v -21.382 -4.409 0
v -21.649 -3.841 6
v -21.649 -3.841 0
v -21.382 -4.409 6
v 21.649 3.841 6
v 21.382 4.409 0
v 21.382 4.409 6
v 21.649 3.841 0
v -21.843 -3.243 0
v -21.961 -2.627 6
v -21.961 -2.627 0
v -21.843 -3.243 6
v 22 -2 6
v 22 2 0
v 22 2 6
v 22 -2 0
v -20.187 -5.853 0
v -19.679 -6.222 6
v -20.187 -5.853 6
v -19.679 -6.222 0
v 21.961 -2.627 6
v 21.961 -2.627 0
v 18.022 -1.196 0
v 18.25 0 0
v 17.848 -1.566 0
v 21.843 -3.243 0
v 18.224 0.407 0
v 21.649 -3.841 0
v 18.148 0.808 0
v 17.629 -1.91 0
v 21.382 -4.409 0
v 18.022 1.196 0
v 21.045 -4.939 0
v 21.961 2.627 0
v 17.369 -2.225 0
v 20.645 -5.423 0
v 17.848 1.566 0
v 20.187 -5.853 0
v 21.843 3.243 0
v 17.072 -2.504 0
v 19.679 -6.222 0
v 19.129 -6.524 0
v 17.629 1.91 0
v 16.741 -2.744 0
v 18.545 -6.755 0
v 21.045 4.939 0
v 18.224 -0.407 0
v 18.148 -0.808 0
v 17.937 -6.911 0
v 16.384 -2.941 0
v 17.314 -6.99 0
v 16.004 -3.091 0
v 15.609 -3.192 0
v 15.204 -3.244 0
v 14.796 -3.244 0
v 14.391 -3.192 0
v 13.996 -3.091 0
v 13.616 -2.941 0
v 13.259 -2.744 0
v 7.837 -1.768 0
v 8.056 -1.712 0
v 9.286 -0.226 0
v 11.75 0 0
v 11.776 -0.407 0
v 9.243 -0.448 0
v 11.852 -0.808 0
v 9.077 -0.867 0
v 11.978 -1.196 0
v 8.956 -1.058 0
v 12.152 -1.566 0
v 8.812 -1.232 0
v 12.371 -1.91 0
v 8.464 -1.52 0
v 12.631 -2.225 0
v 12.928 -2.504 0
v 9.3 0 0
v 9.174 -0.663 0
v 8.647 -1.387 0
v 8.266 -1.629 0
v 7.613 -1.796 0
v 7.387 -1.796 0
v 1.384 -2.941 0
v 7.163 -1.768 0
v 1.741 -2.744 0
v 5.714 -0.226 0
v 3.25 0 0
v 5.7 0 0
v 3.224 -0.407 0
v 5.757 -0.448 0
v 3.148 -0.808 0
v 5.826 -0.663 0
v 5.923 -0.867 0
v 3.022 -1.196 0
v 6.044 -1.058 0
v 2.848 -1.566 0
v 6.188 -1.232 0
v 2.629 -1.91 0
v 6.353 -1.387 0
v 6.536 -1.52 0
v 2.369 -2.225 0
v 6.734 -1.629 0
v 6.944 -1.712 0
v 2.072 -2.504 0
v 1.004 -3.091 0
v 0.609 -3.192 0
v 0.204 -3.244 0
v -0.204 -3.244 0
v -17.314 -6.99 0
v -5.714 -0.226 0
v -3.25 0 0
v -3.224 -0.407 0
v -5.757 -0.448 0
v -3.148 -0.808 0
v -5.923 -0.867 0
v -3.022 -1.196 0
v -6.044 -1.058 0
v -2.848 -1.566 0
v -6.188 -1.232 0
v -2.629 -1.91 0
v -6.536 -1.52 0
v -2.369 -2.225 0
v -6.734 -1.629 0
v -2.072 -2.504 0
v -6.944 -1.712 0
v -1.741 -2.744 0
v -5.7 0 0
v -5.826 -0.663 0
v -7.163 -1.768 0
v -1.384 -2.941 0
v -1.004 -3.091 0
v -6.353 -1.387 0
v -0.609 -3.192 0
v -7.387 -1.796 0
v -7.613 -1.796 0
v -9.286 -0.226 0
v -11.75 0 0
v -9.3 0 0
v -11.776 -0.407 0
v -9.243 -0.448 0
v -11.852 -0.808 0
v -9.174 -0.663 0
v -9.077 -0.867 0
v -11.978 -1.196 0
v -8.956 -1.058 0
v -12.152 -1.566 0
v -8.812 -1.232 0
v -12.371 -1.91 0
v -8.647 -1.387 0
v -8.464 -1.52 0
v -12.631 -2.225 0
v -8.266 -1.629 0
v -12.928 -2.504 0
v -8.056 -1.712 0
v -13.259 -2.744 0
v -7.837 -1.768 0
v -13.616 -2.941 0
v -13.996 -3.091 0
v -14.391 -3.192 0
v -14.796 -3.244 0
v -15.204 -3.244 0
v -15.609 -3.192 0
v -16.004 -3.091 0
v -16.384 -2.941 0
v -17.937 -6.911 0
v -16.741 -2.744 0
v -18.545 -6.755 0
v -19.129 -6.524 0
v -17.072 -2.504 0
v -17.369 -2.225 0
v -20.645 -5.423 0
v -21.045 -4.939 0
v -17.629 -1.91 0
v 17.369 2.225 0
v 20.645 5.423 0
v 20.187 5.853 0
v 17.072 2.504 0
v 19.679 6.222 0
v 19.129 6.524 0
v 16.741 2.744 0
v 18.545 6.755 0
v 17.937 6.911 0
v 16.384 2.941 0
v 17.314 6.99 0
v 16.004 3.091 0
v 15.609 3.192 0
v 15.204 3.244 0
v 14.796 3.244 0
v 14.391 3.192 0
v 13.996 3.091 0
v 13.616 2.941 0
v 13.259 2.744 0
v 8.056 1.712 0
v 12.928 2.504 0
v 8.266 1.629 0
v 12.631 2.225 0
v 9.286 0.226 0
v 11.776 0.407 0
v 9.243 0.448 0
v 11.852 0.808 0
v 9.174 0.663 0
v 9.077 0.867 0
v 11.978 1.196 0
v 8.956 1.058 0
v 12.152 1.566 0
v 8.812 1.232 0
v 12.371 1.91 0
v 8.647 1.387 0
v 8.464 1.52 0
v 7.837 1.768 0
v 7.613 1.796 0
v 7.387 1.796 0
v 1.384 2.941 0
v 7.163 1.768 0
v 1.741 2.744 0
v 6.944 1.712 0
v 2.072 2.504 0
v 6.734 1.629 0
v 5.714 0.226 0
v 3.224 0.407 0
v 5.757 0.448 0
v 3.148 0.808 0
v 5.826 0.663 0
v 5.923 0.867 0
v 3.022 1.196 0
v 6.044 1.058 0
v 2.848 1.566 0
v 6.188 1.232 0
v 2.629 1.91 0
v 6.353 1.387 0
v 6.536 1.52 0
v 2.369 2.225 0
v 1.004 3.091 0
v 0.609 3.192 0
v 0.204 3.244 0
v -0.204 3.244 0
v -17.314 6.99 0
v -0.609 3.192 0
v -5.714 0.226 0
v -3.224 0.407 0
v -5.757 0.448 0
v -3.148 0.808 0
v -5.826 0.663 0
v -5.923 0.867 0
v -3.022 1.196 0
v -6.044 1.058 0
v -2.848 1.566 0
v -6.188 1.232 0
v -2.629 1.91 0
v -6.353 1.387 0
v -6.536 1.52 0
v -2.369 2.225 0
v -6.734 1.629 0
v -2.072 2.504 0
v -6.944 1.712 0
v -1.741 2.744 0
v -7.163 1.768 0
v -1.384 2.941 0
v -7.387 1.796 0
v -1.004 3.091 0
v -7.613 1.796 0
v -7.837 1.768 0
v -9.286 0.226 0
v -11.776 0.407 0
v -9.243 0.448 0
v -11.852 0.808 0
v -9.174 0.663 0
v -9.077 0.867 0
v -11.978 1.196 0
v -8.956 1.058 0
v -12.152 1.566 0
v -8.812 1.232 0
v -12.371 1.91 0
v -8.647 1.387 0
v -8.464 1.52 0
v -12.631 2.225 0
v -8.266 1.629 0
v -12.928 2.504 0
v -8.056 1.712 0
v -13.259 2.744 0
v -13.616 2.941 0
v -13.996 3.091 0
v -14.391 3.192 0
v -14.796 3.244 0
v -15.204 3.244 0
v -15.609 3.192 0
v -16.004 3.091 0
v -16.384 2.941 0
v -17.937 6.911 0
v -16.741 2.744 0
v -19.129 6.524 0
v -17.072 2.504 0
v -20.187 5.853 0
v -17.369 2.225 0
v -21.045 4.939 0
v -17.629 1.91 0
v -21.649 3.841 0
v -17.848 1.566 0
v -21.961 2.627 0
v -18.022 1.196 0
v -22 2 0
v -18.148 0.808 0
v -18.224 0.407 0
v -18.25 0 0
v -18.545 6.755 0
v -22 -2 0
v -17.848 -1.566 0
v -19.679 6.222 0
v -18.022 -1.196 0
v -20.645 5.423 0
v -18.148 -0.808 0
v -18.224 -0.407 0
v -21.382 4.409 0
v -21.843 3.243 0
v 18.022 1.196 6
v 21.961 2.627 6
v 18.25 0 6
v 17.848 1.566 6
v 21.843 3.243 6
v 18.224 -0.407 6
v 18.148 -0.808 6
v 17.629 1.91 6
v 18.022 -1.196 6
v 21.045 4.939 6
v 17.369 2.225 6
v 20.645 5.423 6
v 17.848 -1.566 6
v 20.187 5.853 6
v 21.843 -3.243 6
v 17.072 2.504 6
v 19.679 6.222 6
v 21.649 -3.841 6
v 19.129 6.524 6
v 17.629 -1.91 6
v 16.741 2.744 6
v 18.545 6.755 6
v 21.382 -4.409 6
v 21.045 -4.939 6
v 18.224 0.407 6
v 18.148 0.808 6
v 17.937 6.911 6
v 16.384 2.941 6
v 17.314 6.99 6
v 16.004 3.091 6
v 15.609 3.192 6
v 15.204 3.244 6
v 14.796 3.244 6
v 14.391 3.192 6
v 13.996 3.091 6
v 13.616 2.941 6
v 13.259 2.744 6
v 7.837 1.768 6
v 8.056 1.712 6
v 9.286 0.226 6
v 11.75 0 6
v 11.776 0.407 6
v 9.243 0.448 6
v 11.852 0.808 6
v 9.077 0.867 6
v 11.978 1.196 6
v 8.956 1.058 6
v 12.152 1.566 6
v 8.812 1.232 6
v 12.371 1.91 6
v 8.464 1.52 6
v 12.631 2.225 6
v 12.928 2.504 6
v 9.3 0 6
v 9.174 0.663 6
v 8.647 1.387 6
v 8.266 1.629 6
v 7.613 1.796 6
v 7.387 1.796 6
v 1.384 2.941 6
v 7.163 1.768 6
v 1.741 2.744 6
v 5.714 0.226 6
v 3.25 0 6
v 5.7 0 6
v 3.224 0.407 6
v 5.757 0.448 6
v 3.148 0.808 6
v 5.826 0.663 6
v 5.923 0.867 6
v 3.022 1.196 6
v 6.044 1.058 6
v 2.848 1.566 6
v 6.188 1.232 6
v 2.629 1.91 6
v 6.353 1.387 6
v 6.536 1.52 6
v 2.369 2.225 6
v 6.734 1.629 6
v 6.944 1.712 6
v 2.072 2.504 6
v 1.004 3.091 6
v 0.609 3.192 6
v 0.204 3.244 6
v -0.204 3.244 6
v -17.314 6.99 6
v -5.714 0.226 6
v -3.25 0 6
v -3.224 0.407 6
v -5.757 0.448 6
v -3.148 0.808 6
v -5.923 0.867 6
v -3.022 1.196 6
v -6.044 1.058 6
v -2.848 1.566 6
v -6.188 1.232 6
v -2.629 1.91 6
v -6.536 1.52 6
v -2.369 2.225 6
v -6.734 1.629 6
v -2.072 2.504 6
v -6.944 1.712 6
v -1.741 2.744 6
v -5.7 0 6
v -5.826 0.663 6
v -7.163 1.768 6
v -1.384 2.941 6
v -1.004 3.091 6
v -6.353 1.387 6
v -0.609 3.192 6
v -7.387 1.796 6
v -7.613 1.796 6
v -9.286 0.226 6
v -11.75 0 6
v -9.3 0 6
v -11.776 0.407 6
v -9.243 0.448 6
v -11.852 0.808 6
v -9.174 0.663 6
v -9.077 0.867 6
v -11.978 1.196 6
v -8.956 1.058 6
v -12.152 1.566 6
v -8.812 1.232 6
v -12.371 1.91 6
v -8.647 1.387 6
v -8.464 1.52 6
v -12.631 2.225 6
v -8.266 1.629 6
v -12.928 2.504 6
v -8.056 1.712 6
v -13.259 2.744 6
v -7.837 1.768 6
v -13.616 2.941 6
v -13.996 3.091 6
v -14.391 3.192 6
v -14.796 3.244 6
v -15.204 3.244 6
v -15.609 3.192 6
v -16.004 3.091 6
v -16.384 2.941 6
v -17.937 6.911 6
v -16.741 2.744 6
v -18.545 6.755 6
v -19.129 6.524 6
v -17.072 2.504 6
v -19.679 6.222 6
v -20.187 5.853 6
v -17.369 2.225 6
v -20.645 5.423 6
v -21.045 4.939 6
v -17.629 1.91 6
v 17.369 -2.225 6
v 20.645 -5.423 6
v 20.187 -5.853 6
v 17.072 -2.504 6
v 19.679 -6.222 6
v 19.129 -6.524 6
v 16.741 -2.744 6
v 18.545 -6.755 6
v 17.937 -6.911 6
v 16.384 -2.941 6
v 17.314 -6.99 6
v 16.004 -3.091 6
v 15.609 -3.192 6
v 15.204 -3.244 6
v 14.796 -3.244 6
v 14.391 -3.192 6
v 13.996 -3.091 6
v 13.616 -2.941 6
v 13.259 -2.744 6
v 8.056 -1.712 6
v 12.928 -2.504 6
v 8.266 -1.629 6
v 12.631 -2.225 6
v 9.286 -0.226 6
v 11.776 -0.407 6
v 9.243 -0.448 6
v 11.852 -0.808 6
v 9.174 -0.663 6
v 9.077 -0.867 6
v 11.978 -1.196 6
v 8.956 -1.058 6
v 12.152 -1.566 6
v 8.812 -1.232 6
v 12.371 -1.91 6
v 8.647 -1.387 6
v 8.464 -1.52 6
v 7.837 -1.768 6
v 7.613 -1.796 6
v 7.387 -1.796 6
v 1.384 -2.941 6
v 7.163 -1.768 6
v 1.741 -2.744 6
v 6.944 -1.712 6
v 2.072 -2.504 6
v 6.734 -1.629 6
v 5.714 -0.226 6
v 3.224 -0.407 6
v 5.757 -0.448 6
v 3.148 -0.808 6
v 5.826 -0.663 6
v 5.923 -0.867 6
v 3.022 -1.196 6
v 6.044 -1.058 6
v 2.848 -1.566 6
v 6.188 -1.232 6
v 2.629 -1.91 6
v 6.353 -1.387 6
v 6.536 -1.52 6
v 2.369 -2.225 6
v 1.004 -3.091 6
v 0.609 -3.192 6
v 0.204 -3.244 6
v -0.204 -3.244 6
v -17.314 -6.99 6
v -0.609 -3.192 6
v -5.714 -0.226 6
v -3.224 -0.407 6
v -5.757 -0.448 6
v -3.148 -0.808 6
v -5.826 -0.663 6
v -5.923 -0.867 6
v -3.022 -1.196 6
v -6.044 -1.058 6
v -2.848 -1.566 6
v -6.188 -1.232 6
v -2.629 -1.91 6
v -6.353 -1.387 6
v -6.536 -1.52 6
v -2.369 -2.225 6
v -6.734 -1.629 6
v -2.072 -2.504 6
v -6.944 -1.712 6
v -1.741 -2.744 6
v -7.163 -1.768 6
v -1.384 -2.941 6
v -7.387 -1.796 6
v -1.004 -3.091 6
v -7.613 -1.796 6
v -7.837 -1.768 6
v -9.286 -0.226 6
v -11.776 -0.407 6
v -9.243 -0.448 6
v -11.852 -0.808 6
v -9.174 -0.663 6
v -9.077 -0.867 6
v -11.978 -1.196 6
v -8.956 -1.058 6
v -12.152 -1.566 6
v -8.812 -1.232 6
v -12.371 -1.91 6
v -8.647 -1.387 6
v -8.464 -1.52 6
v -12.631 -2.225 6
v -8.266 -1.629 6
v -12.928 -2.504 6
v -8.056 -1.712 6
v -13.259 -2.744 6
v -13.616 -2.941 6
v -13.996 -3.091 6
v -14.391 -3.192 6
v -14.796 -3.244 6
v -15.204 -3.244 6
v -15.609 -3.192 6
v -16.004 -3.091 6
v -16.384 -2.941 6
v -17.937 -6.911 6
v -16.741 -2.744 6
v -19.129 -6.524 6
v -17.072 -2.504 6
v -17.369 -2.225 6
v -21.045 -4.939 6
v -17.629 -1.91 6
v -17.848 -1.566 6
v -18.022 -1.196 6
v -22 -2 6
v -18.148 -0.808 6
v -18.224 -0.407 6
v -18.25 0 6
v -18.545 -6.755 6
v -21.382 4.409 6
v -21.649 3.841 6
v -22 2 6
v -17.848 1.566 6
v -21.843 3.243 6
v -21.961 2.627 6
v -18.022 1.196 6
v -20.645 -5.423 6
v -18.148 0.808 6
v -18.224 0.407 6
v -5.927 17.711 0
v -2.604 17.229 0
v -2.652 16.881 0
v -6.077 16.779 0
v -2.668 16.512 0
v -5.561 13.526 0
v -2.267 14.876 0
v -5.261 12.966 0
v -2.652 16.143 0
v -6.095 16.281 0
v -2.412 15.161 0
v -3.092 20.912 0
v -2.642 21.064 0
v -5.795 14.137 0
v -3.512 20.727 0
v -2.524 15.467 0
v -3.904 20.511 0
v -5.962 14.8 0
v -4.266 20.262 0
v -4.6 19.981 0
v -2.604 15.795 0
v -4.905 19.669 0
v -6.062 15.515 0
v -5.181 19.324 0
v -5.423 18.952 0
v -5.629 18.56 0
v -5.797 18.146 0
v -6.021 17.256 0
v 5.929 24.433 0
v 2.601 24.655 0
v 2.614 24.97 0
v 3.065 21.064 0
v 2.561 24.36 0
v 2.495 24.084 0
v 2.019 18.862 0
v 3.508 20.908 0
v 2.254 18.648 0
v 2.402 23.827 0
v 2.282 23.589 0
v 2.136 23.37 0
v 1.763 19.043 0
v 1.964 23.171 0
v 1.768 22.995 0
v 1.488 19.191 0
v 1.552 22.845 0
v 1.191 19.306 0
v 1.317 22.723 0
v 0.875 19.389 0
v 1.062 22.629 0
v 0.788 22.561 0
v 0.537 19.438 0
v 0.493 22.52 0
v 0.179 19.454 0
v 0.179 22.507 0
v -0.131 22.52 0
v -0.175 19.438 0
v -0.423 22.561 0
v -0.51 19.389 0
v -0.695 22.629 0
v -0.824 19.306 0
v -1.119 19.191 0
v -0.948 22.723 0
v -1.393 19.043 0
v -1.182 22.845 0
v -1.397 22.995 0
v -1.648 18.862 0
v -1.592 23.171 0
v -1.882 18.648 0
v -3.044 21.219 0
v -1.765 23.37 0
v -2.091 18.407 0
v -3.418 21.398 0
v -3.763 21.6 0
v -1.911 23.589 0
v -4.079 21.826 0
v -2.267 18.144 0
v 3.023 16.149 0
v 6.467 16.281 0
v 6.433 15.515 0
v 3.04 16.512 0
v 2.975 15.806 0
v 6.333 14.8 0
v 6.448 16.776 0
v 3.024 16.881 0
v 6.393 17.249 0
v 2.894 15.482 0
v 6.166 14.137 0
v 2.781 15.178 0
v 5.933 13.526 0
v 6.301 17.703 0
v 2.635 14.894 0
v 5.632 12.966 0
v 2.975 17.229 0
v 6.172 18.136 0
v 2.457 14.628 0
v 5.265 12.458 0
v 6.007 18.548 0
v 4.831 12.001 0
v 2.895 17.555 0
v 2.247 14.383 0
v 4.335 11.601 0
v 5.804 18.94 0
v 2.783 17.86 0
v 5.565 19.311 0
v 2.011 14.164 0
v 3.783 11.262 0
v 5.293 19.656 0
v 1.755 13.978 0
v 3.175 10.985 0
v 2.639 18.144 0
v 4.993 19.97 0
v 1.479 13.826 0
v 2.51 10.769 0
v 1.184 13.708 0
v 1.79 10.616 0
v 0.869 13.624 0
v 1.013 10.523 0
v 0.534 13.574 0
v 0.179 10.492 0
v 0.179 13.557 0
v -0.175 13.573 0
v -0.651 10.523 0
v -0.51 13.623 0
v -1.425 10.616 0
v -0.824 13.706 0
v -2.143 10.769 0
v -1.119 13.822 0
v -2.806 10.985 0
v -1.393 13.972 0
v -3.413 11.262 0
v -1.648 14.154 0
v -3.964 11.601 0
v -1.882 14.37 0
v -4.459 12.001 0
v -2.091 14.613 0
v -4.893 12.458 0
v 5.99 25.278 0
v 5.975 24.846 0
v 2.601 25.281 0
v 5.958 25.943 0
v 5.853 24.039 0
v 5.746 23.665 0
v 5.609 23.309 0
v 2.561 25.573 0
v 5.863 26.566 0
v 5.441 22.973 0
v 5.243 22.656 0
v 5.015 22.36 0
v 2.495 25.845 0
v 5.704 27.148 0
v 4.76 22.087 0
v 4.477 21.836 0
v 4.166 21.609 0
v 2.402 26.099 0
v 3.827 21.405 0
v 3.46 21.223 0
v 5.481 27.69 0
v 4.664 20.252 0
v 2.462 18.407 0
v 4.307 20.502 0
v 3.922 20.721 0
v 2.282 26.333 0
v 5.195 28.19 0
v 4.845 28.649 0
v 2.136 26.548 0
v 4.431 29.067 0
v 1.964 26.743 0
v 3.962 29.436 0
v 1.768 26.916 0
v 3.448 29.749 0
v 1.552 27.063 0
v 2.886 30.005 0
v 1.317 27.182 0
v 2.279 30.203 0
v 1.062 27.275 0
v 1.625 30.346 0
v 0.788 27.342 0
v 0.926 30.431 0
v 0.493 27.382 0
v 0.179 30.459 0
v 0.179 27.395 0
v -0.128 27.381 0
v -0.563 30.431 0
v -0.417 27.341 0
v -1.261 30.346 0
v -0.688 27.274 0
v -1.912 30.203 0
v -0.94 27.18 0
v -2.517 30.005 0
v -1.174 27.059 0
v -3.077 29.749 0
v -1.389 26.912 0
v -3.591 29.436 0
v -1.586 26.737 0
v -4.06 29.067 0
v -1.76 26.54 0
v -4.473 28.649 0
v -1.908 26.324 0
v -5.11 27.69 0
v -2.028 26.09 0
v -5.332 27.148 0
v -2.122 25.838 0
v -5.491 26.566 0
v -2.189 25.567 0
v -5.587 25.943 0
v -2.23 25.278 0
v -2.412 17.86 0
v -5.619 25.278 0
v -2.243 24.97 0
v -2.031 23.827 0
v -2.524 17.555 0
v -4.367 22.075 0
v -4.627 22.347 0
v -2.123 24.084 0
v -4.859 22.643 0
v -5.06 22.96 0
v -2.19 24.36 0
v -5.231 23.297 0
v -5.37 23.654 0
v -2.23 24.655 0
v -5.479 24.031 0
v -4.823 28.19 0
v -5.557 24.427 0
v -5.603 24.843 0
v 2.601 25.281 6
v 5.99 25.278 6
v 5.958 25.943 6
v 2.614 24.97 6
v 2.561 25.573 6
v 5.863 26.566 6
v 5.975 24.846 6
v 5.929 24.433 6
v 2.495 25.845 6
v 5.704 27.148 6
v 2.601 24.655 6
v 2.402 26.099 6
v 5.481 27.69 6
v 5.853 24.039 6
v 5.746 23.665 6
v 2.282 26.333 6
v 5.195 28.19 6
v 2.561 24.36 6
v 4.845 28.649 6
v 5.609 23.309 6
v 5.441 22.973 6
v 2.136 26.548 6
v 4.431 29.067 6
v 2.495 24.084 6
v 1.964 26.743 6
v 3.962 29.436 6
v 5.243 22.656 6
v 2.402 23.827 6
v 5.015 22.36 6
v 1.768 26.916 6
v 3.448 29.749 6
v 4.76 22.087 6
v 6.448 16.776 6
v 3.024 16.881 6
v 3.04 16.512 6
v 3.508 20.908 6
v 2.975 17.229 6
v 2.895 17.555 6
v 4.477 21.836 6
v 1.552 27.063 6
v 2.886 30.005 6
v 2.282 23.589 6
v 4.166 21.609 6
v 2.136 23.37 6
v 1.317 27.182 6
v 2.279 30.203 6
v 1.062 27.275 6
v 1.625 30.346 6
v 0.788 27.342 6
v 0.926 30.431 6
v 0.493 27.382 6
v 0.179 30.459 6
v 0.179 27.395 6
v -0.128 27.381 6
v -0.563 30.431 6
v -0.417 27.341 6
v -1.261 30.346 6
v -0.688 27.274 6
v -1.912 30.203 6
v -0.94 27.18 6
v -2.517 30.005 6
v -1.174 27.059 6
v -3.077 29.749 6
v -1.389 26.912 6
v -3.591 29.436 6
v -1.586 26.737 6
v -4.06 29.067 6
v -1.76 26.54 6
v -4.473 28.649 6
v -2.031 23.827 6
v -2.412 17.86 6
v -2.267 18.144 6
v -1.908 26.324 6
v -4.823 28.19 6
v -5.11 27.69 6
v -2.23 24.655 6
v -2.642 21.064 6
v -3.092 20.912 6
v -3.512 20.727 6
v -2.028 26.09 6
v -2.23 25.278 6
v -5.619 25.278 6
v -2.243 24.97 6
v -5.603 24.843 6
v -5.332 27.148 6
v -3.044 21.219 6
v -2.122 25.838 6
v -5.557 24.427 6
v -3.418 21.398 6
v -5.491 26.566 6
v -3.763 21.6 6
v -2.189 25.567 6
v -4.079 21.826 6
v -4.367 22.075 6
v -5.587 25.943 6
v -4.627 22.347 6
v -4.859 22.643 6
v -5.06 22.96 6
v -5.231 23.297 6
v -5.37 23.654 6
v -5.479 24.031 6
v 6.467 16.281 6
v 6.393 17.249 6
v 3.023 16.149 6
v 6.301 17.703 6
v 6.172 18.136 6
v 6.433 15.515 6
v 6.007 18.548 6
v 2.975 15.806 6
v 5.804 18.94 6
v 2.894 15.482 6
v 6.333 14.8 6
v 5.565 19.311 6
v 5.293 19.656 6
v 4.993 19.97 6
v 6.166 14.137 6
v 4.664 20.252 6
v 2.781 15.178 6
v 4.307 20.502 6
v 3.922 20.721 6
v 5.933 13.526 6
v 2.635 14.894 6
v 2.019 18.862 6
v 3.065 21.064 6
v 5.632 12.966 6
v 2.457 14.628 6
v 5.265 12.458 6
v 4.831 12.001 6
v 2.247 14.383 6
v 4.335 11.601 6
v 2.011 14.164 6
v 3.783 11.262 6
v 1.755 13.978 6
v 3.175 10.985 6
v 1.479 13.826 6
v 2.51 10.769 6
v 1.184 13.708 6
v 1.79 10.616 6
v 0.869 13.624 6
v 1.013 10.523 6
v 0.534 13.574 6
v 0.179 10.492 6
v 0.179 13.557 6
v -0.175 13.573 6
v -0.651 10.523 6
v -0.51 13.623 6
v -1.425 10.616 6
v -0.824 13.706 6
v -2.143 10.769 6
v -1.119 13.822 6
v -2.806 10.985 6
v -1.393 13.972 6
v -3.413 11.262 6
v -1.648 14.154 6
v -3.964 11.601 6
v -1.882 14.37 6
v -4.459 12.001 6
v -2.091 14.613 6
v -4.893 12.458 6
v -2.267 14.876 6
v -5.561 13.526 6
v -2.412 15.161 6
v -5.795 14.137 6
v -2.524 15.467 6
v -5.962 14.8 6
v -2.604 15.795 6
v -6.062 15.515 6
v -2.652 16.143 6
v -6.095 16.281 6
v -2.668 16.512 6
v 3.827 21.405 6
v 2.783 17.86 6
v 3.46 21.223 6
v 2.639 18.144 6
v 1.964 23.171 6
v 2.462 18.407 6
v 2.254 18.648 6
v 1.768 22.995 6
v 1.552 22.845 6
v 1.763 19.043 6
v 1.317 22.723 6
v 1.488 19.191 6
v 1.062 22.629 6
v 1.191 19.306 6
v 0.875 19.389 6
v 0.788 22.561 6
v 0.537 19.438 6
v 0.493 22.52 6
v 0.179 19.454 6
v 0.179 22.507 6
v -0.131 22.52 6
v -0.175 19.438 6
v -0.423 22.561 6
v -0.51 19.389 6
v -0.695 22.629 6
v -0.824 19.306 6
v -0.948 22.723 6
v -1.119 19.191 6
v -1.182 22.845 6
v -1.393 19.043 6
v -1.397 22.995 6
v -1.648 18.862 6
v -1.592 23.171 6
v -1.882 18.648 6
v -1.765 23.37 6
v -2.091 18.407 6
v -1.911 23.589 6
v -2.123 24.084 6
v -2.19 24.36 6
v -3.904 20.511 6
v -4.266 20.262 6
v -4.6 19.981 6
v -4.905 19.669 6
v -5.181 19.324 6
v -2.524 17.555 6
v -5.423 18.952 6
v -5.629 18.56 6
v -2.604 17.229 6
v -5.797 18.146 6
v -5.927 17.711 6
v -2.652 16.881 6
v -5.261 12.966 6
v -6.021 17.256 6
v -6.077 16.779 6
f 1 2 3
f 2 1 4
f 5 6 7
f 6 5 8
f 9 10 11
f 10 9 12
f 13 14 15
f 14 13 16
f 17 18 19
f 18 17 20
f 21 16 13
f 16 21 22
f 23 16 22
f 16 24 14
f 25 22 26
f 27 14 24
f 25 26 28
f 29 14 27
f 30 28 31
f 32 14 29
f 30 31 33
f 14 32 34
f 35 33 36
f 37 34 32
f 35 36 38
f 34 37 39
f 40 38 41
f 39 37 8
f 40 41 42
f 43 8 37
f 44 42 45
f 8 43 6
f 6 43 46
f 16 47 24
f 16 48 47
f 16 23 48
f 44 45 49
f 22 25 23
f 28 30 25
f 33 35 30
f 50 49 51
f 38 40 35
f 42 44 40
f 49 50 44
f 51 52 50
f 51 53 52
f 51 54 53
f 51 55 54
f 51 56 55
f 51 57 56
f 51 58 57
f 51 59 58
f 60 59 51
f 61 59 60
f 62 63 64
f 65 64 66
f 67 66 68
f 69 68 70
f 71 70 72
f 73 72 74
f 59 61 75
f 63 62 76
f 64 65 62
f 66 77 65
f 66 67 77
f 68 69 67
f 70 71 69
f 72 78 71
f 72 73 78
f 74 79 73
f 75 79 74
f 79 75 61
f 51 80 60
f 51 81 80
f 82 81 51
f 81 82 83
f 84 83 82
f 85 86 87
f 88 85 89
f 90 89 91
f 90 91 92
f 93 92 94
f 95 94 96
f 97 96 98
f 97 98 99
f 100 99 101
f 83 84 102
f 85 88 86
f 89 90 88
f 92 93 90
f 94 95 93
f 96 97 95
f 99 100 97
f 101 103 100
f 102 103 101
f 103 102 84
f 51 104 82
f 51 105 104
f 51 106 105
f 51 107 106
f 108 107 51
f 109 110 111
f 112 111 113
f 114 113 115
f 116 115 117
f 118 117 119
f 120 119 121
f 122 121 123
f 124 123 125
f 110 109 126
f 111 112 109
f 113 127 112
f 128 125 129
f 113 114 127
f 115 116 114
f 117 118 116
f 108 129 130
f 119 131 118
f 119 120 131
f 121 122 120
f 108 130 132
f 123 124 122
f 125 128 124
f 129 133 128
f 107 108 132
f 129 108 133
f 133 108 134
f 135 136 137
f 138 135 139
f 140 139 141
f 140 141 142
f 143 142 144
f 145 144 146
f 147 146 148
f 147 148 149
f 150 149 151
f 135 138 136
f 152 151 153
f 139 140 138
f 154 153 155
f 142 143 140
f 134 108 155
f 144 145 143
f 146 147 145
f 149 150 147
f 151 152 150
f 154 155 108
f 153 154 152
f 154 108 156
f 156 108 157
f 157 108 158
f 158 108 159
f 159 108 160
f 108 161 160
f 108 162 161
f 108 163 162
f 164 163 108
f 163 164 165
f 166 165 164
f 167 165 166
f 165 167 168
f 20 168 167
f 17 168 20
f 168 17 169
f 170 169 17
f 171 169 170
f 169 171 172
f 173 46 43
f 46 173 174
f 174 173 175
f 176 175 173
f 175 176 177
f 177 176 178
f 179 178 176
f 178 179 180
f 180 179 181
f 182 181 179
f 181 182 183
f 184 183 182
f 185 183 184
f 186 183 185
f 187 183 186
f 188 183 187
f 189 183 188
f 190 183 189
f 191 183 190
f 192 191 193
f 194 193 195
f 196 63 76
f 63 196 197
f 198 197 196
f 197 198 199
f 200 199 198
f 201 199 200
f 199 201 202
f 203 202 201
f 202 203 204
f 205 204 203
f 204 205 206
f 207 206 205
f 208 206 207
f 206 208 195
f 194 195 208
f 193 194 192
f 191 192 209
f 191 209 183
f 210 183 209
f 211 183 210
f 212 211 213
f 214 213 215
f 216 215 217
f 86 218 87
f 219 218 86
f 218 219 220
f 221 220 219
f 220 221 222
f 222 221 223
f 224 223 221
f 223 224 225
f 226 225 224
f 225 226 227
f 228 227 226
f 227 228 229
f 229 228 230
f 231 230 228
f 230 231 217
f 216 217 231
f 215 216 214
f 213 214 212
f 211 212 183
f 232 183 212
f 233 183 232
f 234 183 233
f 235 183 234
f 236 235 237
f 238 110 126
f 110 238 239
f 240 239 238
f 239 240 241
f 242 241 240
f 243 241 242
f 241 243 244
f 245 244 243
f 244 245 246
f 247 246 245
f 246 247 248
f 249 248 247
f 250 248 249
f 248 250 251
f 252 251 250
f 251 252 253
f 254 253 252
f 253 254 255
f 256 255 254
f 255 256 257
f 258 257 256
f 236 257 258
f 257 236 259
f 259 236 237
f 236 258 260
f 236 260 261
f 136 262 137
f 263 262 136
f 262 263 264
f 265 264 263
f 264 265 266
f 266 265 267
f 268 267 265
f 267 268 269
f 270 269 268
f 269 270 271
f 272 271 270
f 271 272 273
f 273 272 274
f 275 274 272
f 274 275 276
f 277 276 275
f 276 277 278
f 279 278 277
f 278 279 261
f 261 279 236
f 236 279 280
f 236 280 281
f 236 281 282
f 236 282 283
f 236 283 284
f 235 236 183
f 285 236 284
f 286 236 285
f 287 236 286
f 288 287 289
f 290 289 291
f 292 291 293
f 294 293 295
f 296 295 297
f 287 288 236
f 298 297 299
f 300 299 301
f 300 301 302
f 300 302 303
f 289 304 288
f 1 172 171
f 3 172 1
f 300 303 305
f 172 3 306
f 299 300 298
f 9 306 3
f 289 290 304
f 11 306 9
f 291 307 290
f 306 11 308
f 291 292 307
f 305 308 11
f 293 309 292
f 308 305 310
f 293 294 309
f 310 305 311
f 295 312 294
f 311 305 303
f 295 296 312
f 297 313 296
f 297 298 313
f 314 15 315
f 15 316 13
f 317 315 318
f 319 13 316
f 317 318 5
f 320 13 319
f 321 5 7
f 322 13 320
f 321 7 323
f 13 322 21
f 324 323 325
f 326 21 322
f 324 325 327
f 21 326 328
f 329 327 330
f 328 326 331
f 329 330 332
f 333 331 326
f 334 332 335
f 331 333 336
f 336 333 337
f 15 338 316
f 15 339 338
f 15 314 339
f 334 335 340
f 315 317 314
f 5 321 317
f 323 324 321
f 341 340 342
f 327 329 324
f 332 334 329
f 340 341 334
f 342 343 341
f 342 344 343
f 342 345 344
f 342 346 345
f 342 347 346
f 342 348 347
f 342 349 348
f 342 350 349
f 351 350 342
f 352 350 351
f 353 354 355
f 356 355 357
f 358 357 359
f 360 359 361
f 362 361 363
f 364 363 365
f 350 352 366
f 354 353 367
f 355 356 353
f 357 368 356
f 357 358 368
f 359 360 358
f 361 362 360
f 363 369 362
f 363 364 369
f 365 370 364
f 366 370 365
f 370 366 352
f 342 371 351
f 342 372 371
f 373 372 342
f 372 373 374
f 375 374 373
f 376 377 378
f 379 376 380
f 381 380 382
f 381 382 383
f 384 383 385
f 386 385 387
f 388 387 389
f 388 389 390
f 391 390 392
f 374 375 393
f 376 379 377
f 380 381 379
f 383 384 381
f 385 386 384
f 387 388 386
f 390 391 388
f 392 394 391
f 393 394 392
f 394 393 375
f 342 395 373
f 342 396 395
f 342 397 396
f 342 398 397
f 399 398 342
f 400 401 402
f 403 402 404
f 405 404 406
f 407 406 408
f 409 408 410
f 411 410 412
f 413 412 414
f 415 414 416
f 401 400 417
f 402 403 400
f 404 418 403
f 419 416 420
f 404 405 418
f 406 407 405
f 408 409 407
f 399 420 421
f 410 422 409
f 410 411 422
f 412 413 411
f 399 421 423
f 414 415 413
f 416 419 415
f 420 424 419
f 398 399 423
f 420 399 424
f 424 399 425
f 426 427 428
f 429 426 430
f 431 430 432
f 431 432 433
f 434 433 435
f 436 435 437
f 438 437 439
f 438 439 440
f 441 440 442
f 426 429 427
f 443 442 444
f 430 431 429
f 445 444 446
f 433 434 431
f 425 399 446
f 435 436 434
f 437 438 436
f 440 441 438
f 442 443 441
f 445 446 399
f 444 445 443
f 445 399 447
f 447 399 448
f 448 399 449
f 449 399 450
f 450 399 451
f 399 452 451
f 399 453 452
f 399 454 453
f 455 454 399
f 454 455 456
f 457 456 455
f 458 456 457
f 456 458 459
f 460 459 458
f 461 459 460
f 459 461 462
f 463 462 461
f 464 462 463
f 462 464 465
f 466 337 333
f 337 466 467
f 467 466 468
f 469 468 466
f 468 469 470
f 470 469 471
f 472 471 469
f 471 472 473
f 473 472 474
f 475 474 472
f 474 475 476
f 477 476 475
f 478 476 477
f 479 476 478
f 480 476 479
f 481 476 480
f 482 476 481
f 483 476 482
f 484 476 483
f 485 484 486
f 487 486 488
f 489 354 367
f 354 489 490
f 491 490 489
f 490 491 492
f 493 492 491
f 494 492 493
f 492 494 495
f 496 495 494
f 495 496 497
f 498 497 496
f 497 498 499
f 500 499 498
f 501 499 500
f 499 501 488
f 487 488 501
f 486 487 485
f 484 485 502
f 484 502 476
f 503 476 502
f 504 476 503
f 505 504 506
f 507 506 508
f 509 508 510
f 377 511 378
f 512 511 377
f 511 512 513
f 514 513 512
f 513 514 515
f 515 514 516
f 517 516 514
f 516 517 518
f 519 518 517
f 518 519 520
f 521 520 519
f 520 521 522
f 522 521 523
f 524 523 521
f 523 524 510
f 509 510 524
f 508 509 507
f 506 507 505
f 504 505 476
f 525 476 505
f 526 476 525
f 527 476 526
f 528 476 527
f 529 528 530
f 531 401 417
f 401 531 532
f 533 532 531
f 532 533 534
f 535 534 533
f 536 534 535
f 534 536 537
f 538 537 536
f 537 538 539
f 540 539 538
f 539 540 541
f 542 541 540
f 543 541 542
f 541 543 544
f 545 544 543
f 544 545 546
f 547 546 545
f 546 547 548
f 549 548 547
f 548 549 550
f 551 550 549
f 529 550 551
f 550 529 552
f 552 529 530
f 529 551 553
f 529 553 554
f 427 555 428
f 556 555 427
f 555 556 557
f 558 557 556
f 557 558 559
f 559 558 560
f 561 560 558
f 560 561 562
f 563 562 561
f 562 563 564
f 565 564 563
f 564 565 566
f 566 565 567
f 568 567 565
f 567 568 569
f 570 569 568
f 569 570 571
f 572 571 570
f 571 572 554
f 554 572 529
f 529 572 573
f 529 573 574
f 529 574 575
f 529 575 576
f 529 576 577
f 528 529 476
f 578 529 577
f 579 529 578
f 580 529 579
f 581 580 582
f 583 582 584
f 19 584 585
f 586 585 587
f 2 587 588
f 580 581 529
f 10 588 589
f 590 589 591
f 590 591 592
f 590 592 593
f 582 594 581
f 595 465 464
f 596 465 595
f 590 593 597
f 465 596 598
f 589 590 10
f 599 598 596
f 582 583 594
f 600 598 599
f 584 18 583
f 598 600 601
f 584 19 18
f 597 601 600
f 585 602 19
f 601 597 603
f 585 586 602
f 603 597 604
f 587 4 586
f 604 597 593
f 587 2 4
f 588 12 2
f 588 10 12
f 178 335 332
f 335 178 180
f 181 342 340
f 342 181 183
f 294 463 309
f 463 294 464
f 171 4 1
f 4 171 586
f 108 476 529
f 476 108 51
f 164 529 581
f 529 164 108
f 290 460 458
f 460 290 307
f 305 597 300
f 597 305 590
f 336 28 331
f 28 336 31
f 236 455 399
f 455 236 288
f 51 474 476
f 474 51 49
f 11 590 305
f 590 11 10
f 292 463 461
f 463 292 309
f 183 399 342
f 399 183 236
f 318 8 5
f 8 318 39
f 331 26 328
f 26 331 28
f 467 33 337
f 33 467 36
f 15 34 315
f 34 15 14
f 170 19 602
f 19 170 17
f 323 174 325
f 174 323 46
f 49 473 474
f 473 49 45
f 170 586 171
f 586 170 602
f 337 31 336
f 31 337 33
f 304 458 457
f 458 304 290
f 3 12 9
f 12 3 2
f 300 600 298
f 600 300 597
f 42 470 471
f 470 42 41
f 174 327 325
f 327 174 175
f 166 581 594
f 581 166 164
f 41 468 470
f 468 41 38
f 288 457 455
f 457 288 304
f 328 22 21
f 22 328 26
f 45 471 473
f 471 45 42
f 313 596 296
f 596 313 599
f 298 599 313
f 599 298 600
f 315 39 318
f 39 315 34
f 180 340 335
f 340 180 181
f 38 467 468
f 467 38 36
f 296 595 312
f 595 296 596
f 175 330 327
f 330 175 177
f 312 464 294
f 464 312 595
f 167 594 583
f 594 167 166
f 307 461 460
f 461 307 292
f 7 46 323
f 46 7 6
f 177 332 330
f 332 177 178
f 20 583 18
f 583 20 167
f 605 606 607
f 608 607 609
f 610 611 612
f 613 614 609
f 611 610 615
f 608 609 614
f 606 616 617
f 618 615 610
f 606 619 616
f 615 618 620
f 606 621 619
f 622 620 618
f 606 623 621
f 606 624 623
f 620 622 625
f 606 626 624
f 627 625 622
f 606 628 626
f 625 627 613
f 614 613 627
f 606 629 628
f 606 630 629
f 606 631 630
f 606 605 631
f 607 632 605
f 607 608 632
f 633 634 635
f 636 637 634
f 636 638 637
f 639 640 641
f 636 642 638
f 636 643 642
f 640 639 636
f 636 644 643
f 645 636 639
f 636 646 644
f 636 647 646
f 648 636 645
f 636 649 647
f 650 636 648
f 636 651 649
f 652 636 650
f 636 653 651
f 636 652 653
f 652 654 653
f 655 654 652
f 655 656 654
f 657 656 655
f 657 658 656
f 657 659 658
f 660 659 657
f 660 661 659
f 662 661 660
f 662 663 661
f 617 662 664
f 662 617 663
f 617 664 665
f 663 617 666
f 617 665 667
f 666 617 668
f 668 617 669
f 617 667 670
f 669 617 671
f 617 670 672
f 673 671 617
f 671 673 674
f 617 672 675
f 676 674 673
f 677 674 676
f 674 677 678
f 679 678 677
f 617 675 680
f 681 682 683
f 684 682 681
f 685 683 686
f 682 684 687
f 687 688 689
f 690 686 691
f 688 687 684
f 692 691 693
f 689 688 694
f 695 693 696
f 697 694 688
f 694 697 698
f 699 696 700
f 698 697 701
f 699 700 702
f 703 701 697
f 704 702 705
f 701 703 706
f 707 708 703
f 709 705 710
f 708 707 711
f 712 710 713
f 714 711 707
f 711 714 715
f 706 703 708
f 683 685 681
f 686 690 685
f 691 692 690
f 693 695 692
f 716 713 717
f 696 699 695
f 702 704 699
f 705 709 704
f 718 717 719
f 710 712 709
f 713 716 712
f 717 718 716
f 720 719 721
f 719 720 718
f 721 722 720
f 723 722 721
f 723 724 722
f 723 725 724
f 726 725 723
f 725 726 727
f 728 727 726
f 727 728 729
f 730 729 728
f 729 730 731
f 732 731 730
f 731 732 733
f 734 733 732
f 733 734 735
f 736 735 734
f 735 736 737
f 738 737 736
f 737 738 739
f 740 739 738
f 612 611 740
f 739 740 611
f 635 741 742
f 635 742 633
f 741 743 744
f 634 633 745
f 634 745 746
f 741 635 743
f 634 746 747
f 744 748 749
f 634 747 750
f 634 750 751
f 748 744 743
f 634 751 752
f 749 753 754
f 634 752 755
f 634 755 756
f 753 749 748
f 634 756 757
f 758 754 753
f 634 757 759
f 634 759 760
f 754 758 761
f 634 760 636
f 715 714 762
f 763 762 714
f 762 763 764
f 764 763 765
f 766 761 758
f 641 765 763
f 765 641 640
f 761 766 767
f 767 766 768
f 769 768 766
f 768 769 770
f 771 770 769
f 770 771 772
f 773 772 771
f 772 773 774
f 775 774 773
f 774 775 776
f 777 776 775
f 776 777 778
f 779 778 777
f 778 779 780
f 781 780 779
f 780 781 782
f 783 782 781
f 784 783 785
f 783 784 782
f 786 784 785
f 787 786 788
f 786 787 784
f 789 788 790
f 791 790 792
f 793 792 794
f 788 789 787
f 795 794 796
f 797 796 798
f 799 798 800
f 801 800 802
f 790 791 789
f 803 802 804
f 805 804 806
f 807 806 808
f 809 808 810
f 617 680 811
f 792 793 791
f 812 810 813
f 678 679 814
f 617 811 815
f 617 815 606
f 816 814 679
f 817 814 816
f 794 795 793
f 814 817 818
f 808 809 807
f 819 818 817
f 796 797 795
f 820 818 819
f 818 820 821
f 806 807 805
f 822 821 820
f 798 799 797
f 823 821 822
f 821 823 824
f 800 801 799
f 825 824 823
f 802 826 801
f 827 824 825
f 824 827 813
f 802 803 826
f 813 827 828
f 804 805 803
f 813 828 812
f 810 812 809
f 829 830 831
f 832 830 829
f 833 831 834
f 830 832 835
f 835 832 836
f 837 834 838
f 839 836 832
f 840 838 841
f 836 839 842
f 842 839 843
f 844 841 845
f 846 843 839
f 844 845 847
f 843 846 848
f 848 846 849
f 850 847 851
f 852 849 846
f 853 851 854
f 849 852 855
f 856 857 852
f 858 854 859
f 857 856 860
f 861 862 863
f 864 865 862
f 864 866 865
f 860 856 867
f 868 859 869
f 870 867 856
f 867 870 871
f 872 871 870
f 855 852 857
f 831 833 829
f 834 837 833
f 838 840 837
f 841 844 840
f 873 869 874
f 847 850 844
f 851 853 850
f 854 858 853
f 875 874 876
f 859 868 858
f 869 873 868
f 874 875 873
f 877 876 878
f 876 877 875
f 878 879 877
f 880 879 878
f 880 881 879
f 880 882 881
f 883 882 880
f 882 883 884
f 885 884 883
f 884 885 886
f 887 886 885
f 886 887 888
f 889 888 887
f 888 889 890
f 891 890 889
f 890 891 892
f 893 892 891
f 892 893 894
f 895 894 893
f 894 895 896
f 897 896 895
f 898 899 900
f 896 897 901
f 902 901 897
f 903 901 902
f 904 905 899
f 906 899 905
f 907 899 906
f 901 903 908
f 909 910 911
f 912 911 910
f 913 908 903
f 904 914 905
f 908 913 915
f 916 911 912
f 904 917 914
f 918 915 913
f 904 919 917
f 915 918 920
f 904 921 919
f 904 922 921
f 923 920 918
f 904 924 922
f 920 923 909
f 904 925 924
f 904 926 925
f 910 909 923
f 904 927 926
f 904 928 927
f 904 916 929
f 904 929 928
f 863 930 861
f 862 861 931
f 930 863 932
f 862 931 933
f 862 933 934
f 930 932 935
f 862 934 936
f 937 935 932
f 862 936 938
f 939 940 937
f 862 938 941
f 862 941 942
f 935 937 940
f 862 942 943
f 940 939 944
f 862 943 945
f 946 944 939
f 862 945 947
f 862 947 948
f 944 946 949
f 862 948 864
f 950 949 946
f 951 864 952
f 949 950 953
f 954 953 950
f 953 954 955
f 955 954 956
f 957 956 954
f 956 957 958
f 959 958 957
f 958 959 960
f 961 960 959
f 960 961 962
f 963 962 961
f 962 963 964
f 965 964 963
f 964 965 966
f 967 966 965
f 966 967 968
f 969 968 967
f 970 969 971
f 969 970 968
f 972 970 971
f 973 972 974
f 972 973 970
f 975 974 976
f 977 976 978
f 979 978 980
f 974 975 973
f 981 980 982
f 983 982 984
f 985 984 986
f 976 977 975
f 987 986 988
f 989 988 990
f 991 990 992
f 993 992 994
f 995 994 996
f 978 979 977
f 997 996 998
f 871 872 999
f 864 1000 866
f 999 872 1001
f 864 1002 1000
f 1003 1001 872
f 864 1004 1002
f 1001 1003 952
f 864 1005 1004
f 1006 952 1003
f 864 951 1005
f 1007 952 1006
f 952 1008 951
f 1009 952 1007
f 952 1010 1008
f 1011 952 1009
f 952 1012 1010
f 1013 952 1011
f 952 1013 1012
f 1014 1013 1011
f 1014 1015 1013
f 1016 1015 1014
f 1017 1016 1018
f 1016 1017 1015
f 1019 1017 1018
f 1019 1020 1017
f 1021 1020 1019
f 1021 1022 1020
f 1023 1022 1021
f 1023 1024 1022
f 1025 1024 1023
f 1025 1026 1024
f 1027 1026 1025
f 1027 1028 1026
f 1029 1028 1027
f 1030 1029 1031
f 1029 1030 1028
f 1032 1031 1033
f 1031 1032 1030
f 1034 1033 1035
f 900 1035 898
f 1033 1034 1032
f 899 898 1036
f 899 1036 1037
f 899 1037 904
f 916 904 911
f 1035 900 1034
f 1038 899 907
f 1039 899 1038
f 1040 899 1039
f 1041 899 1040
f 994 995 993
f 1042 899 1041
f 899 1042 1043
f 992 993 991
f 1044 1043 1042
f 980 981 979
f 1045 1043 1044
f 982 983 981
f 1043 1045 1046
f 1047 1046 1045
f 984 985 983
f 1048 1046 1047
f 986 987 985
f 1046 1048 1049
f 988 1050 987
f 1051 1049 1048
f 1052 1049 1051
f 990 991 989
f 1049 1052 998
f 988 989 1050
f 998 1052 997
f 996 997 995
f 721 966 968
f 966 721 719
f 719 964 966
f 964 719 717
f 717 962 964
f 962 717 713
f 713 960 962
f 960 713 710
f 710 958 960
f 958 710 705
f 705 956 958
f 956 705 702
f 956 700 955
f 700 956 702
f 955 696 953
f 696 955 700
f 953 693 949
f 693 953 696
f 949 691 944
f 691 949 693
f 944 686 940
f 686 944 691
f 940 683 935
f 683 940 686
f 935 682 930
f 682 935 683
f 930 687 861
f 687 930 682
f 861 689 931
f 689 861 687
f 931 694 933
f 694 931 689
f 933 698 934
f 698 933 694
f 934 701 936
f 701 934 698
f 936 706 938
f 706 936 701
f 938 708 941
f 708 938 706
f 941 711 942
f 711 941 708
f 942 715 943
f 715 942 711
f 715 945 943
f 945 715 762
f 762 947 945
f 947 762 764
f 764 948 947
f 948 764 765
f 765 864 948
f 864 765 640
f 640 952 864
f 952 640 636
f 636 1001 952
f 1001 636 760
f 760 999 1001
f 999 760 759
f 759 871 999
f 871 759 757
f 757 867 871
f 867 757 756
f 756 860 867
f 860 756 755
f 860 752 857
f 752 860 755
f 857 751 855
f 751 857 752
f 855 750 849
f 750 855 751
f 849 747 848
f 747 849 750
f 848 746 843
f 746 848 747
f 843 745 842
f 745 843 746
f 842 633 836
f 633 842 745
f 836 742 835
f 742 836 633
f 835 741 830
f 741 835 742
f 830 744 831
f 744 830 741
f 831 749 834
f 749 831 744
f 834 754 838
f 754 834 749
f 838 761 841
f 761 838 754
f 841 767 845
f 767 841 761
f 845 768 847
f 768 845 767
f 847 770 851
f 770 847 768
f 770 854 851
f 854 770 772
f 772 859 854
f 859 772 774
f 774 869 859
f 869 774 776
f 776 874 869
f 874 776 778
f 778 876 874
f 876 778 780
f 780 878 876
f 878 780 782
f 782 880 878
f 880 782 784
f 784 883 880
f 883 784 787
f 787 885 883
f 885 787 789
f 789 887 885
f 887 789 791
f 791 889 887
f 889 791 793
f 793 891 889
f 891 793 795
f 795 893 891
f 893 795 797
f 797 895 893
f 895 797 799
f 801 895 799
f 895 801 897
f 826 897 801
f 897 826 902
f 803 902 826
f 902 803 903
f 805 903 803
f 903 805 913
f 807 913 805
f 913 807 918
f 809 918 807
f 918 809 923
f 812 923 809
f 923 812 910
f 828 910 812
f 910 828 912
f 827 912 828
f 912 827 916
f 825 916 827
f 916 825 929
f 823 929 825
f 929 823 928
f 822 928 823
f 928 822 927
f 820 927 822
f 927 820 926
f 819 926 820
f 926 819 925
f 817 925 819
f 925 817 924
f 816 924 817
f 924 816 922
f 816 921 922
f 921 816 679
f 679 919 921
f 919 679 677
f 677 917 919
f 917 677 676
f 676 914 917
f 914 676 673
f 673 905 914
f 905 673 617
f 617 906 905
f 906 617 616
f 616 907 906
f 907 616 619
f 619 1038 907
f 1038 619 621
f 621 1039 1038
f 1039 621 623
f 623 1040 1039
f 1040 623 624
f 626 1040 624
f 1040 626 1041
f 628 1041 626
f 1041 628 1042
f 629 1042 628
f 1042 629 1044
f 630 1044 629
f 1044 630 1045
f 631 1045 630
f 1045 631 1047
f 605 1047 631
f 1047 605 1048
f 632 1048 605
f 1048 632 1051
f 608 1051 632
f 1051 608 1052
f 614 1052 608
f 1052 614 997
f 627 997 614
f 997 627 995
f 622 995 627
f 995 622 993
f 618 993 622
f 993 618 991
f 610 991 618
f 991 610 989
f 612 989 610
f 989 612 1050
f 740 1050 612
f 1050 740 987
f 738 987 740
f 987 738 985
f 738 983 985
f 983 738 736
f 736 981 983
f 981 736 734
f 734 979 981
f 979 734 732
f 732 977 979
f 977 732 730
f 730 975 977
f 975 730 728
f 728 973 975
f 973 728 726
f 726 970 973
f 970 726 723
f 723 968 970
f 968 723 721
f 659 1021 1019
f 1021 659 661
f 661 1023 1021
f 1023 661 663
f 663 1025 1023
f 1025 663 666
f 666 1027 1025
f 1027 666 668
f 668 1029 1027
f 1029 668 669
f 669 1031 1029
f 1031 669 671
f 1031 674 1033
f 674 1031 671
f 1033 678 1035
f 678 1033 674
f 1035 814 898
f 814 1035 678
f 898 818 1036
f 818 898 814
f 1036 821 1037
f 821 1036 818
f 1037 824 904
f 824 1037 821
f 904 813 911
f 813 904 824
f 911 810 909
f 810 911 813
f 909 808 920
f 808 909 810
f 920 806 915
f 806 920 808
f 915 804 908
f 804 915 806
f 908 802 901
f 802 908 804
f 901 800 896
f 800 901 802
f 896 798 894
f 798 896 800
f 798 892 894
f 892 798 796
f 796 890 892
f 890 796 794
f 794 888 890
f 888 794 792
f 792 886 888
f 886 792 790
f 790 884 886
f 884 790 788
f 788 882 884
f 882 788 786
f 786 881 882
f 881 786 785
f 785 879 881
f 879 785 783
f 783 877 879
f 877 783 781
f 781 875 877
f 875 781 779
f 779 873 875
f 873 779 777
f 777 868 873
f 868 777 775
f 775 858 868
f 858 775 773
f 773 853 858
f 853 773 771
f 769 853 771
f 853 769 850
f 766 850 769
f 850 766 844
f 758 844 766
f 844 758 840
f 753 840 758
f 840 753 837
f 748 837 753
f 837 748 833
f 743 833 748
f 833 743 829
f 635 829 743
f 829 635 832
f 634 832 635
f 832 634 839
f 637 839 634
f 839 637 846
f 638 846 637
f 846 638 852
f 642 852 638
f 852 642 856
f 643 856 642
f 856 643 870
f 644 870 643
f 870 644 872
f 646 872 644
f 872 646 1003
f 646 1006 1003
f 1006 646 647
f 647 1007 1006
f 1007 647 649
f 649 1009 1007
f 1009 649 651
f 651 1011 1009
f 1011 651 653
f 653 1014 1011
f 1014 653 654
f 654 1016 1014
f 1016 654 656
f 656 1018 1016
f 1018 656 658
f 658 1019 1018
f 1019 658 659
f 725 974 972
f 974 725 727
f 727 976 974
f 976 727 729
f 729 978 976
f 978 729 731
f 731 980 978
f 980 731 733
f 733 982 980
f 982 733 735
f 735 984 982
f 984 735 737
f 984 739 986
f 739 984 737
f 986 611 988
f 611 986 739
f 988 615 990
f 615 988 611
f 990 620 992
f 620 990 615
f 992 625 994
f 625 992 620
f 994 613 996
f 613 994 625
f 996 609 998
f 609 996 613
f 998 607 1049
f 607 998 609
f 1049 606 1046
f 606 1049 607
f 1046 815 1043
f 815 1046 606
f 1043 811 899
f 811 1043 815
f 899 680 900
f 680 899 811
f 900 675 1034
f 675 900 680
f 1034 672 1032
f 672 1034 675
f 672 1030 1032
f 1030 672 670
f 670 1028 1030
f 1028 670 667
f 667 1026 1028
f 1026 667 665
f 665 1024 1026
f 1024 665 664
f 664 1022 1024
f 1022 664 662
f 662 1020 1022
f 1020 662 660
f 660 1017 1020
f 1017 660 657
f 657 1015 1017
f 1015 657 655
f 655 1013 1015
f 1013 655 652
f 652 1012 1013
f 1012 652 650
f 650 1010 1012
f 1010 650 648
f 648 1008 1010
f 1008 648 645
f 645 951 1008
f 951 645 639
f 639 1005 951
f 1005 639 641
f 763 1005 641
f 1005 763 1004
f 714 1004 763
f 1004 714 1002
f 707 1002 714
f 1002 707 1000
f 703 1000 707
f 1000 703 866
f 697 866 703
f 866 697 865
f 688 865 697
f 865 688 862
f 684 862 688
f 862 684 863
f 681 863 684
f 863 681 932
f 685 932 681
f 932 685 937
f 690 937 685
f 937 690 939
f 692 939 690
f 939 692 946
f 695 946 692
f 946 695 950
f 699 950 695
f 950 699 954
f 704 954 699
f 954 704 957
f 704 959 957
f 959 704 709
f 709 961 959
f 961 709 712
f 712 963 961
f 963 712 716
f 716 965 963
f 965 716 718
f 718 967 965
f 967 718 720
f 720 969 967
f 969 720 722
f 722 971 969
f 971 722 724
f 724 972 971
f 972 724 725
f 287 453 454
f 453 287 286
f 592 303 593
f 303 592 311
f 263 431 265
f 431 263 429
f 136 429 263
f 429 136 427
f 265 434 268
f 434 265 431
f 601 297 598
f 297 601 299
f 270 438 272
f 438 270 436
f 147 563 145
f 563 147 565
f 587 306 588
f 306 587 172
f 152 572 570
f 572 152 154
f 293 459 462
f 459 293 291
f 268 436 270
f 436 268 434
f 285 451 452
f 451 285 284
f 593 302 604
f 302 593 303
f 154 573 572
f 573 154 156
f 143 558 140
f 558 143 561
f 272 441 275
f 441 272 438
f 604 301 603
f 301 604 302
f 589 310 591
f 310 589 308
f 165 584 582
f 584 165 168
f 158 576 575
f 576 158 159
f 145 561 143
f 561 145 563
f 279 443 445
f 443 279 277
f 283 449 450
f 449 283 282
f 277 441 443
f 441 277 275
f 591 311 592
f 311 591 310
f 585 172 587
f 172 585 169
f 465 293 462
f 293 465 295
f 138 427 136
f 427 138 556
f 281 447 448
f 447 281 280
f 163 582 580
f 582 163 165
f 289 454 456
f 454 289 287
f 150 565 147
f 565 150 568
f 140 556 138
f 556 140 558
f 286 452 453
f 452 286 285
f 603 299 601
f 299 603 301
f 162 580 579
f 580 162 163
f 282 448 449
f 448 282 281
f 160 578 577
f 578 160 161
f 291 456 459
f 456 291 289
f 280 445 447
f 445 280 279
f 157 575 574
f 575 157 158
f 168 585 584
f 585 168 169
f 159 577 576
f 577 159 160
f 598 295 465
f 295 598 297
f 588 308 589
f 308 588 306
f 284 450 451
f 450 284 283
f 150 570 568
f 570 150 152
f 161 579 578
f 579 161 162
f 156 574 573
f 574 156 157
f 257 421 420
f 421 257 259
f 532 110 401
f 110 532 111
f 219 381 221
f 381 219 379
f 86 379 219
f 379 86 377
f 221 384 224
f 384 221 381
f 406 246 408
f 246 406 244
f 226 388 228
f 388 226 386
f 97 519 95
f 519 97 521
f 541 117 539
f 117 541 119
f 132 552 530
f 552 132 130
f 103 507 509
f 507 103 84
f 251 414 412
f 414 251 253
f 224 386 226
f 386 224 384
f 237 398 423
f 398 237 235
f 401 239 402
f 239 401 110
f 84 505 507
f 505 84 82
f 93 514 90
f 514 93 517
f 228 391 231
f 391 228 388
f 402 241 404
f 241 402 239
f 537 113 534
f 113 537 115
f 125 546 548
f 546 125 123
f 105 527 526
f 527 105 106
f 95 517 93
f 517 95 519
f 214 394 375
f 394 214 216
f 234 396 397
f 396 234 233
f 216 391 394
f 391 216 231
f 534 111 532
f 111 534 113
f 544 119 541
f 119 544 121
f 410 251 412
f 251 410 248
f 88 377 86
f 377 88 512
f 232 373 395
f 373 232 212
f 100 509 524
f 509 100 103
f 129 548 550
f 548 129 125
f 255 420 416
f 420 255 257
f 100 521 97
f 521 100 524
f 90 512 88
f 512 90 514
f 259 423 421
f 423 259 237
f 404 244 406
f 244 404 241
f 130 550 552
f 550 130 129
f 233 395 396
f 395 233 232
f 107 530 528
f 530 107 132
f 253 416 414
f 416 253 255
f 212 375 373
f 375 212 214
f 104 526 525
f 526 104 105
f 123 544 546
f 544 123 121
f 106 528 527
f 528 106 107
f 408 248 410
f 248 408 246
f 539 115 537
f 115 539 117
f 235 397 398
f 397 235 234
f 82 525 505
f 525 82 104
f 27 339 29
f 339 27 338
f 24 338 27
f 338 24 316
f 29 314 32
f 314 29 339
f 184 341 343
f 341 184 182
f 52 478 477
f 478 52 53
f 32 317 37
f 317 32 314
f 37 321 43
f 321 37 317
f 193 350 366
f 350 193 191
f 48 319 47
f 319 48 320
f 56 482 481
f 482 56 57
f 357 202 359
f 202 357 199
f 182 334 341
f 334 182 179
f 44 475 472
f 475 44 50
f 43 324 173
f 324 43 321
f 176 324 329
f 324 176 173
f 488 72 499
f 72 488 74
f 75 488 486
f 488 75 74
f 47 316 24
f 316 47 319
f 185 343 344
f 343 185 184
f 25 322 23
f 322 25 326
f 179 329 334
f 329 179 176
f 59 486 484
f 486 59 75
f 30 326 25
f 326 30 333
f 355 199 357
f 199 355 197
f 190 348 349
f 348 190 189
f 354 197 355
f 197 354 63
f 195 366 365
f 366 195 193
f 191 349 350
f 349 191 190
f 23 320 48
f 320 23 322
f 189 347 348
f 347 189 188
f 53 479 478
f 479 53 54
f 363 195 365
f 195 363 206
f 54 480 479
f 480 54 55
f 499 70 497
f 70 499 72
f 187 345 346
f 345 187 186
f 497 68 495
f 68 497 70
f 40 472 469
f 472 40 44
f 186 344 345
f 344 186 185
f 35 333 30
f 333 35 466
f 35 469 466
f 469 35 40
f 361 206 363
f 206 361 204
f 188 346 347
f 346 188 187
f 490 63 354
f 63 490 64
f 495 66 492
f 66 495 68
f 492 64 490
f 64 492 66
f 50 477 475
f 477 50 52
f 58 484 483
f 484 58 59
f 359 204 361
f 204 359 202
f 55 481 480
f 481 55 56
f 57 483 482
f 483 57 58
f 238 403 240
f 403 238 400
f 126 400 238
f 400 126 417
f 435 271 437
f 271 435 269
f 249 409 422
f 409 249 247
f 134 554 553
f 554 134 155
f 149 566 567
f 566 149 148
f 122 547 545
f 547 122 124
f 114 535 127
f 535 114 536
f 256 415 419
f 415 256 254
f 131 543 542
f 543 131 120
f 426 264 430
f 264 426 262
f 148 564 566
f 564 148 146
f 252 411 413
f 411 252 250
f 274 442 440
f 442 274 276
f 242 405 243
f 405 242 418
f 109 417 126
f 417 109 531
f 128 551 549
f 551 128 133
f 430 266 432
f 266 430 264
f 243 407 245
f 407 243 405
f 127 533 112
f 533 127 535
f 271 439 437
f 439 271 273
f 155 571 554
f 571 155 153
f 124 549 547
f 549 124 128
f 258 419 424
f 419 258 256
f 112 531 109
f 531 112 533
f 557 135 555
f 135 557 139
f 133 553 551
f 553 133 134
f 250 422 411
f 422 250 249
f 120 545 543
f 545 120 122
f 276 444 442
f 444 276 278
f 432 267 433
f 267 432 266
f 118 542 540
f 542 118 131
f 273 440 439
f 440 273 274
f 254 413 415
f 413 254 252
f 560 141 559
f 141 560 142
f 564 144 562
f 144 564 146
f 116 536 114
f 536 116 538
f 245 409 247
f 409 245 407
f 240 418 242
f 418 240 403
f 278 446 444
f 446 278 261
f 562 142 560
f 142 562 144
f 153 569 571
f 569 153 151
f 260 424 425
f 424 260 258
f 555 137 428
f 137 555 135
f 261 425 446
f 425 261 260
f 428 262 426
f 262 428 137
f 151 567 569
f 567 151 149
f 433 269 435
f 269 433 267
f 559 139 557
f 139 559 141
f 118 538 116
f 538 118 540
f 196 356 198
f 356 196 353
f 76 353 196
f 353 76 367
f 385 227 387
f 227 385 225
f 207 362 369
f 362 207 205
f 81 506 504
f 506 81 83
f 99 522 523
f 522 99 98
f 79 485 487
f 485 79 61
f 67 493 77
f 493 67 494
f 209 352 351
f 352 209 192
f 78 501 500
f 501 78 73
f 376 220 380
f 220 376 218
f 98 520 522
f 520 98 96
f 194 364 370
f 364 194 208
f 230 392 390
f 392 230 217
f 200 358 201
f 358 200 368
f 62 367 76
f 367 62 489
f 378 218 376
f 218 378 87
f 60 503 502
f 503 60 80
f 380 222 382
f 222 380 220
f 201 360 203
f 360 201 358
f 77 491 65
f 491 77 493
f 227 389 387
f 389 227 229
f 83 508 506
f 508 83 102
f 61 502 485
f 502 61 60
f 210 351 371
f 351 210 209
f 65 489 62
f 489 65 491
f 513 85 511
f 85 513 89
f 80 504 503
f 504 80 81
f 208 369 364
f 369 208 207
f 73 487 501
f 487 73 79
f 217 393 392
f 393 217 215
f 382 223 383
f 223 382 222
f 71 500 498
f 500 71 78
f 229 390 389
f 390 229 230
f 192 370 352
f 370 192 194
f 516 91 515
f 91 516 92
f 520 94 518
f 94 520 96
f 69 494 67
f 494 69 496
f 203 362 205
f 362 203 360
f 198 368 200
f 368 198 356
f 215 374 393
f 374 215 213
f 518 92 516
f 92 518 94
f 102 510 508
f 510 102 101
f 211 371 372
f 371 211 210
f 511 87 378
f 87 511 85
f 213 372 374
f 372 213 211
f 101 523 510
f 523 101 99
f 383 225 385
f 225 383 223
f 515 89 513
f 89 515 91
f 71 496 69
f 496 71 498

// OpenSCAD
$fn = 50;


difference() {
	union() {
		hull() {
			translate(v = [-17.0000000000, 2.0000000000, 0]) {
				cylinder(h = 6, r = 5);
			}
			translate(v = [17.0000000000, 2.0000000000, 0]) {
				cylinder(h = 6, r = 5);
			}
			translate(v = [-17.0000000000, -2.0000000000, 0]) {
				cylinder(h = 6, r = 5);
			}
			translate(v = [17.0000000000, -2.0000000000, 0]) {
				cylinder(h = 6, r = 5);
			}
		}
		translate(v = [0, 30.0000000000, 0]) {
			linear_extrude(height = 6) {
				text(font = "DejaVu Sans Mono:style=Bold", halign = "center", size = 19.0000000000, text = "8", valign = "top");
			}
		}
	}
	union() {
		translate(v = [-15.0000000000, 0.0000000000, 0]) {
			translate(v = [0, 0, -100]) {
				cylinder(h = 200, r = 3.2500000000);
			}
		}
		translate(v = [0, 0, -100]) {
			cylinder(h = 200, r = 3.2500000000);
		}
		translate(v = [15.0000000000, 0.0000000000, 0]) {
			translate(v = [0, 0, -100]) {
				cylinder(h = 200, r = 3.2500000000);
			}
		}
		translate(v = [-15.0000000000, 0.0000000000, 0]) {
			translate(v = [0, 0, -100]) {
				cylinder(h = 200, r = 1.8000000000);
			}
		}
		translate(v = [-7.5000000000, 0.0000000000, 0]) {
			translate(v = [0, 0, -100]) {
				cylinder(h = 200, r = 1.8000000000);
			}
		}
		translate(v = [0, 0, -100]) {
			cylinder(h = 200, r = 1.8000000000);
		}
		translate(v = [7.5000000000, 0.0000000000, 0]) {
			translate(v = [0, 0, -100]) {
				cylinder(h = 200, r = 1.8000000000);
			}
		}
		translate(v = [15.0000000000, 0.0000000000, 0]) {
			translate(v = [0, 0, -100]) {
				cylinder(h = 200, r = 1.8000000000);
			}
		}
	}
}
